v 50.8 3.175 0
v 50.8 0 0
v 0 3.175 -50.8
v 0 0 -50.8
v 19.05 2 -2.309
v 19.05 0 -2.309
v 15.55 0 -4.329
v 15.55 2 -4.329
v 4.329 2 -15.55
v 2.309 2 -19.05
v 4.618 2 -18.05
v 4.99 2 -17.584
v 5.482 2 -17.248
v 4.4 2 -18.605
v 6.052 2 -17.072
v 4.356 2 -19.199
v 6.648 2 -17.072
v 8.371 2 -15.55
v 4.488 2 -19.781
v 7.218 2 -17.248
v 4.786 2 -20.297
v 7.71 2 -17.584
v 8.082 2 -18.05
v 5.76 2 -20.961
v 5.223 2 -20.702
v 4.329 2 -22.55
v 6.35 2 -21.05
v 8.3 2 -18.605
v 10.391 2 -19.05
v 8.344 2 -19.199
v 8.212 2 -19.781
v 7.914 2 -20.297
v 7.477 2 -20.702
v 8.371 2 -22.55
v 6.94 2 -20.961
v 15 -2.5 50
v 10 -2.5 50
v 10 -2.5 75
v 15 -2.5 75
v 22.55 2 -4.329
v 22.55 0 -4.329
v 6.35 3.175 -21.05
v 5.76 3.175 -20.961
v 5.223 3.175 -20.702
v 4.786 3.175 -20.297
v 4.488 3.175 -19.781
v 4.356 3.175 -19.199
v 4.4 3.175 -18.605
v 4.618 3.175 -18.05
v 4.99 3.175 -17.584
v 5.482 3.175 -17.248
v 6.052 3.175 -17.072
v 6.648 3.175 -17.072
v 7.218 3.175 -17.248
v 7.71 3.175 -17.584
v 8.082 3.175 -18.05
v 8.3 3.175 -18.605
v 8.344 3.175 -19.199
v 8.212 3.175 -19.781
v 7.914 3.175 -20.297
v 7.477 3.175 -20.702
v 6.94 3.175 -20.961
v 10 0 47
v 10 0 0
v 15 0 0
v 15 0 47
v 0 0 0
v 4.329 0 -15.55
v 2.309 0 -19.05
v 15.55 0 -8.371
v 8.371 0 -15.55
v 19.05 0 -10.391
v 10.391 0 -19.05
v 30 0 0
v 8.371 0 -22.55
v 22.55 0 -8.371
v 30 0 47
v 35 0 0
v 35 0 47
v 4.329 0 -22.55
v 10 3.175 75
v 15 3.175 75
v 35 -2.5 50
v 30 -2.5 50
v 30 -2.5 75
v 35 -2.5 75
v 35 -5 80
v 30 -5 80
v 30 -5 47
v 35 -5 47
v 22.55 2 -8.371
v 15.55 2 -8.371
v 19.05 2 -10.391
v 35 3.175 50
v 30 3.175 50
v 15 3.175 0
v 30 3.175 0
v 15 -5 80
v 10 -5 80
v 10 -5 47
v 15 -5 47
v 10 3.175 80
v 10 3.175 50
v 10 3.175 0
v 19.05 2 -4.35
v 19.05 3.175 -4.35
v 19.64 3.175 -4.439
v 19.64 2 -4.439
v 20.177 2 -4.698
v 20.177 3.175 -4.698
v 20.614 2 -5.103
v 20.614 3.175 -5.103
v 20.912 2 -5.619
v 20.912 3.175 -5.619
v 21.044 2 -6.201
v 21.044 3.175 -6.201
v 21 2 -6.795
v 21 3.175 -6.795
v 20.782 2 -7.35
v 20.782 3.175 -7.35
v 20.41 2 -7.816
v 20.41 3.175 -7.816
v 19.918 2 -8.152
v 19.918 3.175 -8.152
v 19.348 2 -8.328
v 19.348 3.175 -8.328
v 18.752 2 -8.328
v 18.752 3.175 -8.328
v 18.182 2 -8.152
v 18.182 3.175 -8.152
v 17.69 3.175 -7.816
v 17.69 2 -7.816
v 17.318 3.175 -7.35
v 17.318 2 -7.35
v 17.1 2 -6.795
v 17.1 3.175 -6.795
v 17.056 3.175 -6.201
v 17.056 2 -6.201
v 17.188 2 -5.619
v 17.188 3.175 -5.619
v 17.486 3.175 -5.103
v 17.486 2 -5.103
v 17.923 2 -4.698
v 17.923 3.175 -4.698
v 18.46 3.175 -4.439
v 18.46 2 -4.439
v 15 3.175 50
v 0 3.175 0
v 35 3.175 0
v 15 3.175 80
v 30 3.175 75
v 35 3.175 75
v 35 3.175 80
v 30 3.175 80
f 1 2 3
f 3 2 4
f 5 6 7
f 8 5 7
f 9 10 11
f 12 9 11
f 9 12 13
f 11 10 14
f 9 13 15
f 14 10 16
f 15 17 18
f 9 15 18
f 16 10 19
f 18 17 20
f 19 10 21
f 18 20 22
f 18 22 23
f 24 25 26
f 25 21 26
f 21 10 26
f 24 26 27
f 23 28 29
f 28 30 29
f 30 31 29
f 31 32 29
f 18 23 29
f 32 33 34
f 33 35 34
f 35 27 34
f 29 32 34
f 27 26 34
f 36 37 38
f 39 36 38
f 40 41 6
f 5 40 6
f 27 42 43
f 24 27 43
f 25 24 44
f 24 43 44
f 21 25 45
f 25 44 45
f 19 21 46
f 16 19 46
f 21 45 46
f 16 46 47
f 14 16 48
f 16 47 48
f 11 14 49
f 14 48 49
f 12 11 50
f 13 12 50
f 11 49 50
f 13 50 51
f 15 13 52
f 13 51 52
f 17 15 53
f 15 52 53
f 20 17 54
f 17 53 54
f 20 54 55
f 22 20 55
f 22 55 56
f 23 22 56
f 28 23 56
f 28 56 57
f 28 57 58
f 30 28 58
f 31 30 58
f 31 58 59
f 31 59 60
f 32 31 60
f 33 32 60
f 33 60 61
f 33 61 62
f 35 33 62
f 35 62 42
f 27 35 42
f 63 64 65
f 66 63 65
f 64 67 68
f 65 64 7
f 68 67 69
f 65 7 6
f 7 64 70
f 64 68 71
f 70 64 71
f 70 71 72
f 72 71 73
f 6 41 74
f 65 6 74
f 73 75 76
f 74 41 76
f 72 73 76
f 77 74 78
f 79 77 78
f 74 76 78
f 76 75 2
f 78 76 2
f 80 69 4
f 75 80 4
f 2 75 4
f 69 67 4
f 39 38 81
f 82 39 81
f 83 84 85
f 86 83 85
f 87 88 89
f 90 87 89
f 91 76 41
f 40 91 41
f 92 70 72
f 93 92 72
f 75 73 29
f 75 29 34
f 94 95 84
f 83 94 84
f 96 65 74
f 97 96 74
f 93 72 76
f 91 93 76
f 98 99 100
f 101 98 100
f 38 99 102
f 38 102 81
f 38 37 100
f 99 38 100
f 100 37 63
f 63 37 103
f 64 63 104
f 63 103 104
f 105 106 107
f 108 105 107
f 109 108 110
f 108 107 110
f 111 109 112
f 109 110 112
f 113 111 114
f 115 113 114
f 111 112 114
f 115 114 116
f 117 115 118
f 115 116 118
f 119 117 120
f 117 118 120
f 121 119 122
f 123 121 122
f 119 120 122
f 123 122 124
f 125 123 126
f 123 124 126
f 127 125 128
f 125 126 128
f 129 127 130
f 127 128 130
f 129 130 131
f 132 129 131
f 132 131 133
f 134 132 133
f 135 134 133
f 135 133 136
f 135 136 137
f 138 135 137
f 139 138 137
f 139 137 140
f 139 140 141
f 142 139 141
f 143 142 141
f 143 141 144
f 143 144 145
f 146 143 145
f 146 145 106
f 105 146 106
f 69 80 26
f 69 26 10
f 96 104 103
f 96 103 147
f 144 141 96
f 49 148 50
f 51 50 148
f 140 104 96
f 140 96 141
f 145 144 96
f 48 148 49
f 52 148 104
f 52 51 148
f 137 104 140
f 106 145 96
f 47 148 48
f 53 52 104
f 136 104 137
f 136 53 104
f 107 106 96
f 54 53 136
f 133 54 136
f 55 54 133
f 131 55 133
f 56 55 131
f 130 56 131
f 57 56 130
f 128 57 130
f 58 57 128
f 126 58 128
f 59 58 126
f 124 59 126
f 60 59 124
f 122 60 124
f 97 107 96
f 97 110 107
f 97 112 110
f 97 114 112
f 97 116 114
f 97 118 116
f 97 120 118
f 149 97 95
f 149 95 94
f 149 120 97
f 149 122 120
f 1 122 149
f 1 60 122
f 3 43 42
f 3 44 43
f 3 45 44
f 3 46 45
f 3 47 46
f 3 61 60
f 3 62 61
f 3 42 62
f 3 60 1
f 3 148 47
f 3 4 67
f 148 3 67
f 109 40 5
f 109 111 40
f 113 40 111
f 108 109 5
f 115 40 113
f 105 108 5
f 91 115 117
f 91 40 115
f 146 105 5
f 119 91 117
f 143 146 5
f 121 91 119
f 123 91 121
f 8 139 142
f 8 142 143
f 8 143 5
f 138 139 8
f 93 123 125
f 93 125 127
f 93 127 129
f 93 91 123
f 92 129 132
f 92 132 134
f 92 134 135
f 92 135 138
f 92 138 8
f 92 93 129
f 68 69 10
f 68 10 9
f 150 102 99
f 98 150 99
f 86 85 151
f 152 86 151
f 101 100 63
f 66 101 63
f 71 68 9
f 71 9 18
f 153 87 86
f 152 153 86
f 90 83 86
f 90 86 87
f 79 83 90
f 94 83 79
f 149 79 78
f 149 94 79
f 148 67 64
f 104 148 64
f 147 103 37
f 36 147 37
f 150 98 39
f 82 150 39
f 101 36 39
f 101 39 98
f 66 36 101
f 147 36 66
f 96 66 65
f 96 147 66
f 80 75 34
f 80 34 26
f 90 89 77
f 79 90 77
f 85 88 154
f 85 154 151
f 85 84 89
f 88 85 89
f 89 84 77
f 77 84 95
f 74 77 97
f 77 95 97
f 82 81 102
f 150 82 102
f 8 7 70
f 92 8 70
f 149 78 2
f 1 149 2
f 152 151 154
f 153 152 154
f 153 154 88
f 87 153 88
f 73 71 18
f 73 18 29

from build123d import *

# Parameters (mm, degrees)
BOSS_EXTRUDE1_DEPTH = 3.175
SKETCH2_R           = 2
CUT_EXTRUDE1_DEPTH  = 72.912172996
CUT_EXTRUDE2_START  = -3.175
CUT_EXTRUDE2_DEPTH  = 2
BOSS_EXTRUDE2_START = 10
BOSS_EXTRUDE2_DEPTH = 5
BOSS_EXTRUDE3_START = 30
BOSS_EXTRUDE3_DEPTH = 5


with BuildPart() as part:
    # Sketch1 → Boss-Extrude1 (new body)
    with BuildSketch(Plane(origin=(0, 0, 0), x_dir=(1, 0, 0), z_dir=(0, 1, 0))):
        Polygon((0, 0), (50.8, 0), (0, 50.8), align=None)
    extrude(amount=BOSS_EXTRUDE1_DEPTH)

    # Sketch2 → Cut-Extrude1 (cut, through all)
    with BuildSketch(Plane(origin=(0, 3.175, 0), x_dir=(1, 0, 0), z_dir=(0, 1, 0))):
        with Locations(Location((19.05, 6.35, 0), (0, 0, 270))):
            Circle(SKETCH2_R)
        with Locations(Location((6.35, 19.05, 0), (0, 0, 90))):
            Circle(SKETCH2_R)
    extrude(amount=-CUT_EXTRUDE1_DEPTH, mode=Mode.SUBTRACT)

    # Sketch3 → Cut-Extrude2 (cut)
    with BuildSketch(Plane(origin=(0, 3.175, 0), x_dir=(1, 0, 0), z_dir=(0, 1, 0)).offset(CUT_EXTRUDE2_START)):
        Polygon((8.370723055, 15.550005), (10.391446111, 19.05), (8.370723055, 22.549995), (4.329276945, 22.549995), (2.308553889, 19.05), (4.329276945, 15.550005), align=None)
        Polygon((22.549995, 4.329276945), (19.05, 2.308553889), (15.550005, 4.329276945), (15.550005, 8.370723055), (19.05, 10.391446111), (22.549995, 8.370723055), align=None)
    extrude(amount=CUT_EXTRUDE2_DEPTH, mode=Mode.SUBTRACT)

    # Sketch5 → Boss-Extrude2 (add)
    with BuildSketch(Plane(origin=(0, 0, 0), x_dir=(0, 0, -1), z_dir=(1, 0, 0)).offset(BOSS_EXTRUDE2_START)):
        Polygon((0, 0), (0, 3.175), (-50, 3.175), (-50, -2.5), (-75, -2.5), (-75, 3.175), (-80, 3.175), (-80, -5), (-47, -5), (-47, 0), align=None)
    extrude(amount=BOSS_EXTRUDE2_DEPTH)

    # Sketch5<3> → Boss-Extrude3 (add)
    with BuildSketch(Plane(origin=(0, 0, 0), x_dir=(0, 0, -1), z_dir=(1, 0, 0)).offset(BOSS_EXTRUDE3_START)):
        Polygon((0, 0), (0, 3.175), (-50, 3.175), (-50, -2.5), (-75, -2.5), (-75, 3.175), (-80, 3.175), (-80, -5), (-47, -5), (-47, 0), align=None)
    extrude(amount=BOSS_EXTRUDE3_DEPTH)


solid = part.part
